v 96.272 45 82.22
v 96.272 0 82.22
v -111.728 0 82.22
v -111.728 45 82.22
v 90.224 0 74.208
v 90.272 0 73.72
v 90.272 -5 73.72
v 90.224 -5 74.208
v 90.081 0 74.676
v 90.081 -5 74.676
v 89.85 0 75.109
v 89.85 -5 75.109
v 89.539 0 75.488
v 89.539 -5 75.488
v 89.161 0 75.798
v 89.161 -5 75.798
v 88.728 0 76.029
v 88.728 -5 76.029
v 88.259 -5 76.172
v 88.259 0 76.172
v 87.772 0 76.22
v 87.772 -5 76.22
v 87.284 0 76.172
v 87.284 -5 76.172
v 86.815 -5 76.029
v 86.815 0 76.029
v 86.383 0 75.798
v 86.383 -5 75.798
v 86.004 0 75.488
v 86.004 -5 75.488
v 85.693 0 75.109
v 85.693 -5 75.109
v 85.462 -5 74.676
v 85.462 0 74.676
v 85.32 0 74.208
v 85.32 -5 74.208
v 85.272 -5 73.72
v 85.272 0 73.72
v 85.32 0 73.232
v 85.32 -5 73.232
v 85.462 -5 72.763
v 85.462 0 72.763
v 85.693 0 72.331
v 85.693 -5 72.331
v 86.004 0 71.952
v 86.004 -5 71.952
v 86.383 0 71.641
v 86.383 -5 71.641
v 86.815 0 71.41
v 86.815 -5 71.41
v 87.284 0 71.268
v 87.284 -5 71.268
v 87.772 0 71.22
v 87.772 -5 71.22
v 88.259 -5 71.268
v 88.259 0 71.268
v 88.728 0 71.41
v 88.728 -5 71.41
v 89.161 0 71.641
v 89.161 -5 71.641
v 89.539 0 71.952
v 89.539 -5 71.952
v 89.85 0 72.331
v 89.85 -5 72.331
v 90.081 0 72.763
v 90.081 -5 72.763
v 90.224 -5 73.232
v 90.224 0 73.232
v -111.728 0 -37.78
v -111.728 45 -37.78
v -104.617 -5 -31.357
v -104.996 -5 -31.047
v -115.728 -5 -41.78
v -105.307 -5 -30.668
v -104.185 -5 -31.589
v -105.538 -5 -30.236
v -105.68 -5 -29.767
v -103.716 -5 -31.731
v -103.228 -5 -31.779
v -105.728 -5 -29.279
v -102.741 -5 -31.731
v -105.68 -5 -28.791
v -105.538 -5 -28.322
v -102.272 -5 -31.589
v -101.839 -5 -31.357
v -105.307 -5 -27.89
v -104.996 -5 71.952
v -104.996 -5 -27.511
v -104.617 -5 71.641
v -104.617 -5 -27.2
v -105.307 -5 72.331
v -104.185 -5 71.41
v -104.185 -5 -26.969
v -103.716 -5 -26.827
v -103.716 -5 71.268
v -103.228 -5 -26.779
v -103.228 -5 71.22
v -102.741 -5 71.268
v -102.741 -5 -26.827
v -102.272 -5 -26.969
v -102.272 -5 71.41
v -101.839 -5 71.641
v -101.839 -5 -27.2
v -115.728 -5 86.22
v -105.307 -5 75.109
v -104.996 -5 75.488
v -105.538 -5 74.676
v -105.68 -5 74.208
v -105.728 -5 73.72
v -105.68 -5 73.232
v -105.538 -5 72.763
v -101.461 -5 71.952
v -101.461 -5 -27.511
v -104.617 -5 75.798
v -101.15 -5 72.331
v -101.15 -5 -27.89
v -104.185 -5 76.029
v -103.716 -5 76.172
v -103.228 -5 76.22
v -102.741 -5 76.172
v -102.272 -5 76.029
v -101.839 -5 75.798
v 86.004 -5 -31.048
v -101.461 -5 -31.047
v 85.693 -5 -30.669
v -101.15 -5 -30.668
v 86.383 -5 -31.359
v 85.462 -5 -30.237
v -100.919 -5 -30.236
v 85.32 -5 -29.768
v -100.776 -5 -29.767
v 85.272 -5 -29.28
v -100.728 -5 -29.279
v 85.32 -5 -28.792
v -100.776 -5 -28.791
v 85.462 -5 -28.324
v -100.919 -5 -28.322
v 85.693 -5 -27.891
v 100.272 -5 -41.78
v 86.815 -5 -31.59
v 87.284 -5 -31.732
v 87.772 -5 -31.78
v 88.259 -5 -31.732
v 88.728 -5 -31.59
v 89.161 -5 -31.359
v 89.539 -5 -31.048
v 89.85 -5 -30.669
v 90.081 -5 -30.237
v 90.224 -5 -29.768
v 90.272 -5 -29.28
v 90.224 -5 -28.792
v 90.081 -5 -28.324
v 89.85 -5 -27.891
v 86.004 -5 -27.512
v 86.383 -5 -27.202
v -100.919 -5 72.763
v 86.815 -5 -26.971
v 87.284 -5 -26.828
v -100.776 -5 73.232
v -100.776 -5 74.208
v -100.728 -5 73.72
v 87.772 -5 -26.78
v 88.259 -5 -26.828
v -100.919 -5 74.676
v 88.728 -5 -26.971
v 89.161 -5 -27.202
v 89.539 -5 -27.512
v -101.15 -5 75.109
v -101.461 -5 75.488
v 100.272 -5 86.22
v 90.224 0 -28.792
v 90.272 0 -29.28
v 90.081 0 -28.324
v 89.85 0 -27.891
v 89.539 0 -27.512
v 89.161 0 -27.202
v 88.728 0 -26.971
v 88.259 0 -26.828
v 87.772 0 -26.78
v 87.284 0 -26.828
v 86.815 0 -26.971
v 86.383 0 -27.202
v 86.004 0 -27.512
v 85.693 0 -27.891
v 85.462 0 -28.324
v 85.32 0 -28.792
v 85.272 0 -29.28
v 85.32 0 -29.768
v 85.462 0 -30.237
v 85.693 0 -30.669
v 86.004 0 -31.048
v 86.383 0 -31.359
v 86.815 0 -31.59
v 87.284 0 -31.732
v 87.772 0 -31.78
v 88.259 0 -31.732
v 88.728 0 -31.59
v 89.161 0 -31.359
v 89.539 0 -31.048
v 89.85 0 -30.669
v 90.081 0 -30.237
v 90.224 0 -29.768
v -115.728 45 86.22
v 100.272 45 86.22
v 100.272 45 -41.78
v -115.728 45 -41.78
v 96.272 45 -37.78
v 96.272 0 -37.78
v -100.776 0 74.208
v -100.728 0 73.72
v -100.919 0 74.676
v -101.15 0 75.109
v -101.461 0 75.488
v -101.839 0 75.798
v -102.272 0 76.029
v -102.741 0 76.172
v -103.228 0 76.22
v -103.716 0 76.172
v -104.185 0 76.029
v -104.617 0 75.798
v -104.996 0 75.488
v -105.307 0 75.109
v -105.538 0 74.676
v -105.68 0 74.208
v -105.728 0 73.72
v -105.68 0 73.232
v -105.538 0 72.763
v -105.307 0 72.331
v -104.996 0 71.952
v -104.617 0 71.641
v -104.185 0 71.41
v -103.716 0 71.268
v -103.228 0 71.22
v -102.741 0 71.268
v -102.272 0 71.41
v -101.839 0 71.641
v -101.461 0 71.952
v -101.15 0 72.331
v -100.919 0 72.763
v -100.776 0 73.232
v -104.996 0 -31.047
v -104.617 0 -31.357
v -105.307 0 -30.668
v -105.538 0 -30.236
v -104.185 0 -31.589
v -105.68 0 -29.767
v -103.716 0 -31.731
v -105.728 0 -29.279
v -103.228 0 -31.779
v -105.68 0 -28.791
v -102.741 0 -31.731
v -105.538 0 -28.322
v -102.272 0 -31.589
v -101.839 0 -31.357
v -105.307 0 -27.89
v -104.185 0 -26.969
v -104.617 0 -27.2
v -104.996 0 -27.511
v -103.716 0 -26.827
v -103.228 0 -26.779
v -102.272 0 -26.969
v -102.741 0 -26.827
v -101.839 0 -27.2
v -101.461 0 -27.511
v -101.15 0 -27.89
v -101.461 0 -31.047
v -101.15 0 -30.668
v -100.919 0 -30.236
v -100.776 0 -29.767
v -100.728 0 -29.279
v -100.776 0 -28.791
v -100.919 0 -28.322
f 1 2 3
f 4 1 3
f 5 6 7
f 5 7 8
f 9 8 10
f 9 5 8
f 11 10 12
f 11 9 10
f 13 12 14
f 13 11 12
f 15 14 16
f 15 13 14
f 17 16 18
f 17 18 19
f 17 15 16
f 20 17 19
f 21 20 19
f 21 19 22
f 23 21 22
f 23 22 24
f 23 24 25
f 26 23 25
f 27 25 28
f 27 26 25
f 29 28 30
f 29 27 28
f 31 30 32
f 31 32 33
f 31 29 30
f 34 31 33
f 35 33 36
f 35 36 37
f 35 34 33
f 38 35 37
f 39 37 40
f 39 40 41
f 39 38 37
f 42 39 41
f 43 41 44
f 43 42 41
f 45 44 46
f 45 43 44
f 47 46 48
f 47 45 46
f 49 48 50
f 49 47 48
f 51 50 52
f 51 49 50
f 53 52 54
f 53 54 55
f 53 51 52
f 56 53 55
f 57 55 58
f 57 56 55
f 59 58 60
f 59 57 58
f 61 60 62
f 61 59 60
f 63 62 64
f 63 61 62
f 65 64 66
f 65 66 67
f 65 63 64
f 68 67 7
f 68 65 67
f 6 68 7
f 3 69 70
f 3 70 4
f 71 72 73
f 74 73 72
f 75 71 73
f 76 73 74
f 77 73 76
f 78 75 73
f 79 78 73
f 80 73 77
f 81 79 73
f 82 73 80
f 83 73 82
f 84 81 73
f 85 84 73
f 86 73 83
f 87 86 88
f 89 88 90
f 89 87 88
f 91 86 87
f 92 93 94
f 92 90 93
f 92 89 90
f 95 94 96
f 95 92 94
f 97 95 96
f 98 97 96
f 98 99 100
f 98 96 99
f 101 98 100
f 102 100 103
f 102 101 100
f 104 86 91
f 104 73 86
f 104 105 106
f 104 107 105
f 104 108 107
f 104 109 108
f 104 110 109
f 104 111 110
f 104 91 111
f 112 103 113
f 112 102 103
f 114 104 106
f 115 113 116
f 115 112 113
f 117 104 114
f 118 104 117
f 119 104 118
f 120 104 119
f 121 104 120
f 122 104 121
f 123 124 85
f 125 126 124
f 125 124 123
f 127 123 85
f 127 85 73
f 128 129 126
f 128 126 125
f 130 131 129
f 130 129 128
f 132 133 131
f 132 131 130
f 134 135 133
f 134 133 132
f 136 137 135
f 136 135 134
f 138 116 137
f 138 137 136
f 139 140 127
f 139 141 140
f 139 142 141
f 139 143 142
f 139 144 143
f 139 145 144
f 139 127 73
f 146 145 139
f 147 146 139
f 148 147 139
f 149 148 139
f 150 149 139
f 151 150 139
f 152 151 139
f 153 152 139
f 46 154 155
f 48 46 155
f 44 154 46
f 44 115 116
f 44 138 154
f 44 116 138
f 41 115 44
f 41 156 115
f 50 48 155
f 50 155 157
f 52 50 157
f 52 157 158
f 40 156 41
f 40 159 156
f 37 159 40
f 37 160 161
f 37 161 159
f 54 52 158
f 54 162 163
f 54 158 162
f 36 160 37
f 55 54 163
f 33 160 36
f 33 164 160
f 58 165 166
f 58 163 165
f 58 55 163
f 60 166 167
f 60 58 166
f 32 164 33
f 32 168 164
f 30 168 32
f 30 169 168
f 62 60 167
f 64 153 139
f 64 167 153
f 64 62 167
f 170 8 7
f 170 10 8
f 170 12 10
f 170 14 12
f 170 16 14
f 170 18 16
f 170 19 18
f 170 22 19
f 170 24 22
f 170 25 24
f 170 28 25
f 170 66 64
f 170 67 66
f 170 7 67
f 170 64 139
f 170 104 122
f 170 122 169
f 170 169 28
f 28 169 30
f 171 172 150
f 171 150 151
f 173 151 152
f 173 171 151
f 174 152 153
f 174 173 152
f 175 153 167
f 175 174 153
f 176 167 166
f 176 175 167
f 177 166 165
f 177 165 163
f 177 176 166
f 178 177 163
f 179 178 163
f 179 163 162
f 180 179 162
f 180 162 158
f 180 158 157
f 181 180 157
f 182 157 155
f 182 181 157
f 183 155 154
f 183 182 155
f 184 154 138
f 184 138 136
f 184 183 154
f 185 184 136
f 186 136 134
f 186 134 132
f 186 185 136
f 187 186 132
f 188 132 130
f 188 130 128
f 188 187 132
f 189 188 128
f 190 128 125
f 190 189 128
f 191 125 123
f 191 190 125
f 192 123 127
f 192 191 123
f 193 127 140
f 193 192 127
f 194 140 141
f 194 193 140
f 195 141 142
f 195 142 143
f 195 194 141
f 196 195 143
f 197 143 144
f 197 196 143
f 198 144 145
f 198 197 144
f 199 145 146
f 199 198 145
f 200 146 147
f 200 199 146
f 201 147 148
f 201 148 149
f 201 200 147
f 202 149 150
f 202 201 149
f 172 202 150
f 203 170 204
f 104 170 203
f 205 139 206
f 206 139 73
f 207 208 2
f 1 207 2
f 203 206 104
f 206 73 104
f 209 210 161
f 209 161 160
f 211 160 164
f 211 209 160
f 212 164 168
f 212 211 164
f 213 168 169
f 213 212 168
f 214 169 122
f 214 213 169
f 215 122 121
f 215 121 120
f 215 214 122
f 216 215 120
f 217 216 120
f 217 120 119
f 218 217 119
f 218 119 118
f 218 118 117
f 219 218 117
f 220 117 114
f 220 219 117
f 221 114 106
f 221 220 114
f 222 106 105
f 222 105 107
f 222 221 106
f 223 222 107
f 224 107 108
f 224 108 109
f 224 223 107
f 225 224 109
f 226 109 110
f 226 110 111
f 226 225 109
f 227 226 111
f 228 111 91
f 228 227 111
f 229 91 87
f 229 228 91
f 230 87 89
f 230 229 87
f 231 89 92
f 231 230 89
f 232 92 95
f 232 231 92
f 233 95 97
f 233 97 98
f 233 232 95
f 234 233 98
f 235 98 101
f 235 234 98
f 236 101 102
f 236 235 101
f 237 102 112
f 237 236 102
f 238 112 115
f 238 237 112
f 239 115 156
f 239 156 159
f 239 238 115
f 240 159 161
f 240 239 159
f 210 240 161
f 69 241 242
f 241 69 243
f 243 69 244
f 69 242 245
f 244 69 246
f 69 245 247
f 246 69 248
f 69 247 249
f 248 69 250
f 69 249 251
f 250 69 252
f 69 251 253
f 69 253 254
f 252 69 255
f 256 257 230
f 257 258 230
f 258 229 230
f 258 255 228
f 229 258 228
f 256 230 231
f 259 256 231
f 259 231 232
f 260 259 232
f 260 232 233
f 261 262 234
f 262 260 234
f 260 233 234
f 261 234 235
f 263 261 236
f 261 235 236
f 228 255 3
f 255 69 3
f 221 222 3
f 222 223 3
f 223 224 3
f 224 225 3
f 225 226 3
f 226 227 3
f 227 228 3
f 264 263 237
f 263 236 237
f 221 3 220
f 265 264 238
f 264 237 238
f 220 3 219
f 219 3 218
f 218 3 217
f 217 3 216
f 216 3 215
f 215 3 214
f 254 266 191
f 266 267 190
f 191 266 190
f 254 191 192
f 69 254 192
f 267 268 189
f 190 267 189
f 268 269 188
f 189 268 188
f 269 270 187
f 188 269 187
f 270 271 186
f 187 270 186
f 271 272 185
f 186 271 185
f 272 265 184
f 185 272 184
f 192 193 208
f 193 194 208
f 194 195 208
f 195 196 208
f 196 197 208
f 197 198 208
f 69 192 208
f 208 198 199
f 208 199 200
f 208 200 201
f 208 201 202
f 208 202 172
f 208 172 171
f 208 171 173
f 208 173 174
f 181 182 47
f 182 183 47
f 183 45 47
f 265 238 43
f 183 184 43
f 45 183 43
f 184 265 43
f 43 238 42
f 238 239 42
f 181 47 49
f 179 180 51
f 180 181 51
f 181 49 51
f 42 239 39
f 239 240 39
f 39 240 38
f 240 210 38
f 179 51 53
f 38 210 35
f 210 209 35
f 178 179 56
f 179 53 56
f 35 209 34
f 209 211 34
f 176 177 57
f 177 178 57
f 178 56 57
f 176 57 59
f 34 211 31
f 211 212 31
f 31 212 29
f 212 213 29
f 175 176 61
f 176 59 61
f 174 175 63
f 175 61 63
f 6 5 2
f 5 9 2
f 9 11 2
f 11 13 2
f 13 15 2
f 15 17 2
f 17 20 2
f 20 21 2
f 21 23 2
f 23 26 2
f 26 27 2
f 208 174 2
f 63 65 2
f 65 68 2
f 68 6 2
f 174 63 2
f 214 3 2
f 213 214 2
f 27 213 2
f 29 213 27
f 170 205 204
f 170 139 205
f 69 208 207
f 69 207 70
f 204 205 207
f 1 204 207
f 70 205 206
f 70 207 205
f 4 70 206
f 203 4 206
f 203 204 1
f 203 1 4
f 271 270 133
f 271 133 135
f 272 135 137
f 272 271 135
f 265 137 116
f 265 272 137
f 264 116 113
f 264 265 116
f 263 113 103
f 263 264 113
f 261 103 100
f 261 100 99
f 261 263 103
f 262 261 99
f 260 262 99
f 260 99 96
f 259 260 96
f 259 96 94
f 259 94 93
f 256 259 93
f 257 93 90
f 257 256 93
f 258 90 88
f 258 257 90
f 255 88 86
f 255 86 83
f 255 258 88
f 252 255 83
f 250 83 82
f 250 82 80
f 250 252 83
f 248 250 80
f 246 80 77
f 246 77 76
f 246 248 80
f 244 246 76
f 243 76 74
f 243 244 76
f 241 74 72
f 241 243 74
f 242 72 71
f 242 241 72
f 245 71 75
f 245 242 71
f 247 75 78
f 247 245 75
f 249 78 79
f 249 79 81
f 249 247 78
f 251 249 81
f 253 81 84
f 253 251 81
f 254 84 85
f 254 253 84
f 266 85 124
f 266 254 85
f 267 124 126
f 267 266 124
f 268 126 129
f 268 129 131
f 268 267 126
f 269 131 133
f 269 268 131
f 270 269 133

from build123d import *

# Parameters (mm, degrees)
F0_W     = 216
F0_H     = 128
F0_R     = 2.5
F1_DEPTH = 5
F2_W     = 216
F2_H     = 128
F2_W_2   = 208
F2_H_2   = 120
F3_DEPTH = 45


with BuildPart() as f1:
    # F0 (on Front) → F1 (new body)
    with BuildSketch(Plane.XZ):
        with Locations((-7.728394, 22.219788)):
            Rectangle(F0_W, F0_H)
        with Locations((-103.228394, -29.278811)):
            Circle(F0_R, mode=Mode.SUBTRACT)
        with Locations((87.771606, -29.280212)):
            Circle(F0_R, mode=Mode.SUBTRACT)
        with Locations((-103.228394, 73.719788)):
            Circle(F0_R, mode=Mode.SUBTRACT)
        with Locations((87.771606, 73.719788)):
            Circle(F0_R, mode=Mode.SUBTRACT)
    extrude(amount=F1_DEPTH)

    # F2 (on face) → F3 (join)
    with BuildSketch(Plane(origin=(0, 0, 0), x_dir=(-1, 0, 0), z_dir=(0, 1, 0))):
        with Locations((7.728394, 22.219788)):
            Rectangle(F2_W, F2_H)
        with Locations((7.728394, 22.219788)):
            Rectangle(F2_W_2, F2_H_2, mode=Mode.SUBTRACT)
    extrude(amount=F3_DEPTH)


solid = f1.part
